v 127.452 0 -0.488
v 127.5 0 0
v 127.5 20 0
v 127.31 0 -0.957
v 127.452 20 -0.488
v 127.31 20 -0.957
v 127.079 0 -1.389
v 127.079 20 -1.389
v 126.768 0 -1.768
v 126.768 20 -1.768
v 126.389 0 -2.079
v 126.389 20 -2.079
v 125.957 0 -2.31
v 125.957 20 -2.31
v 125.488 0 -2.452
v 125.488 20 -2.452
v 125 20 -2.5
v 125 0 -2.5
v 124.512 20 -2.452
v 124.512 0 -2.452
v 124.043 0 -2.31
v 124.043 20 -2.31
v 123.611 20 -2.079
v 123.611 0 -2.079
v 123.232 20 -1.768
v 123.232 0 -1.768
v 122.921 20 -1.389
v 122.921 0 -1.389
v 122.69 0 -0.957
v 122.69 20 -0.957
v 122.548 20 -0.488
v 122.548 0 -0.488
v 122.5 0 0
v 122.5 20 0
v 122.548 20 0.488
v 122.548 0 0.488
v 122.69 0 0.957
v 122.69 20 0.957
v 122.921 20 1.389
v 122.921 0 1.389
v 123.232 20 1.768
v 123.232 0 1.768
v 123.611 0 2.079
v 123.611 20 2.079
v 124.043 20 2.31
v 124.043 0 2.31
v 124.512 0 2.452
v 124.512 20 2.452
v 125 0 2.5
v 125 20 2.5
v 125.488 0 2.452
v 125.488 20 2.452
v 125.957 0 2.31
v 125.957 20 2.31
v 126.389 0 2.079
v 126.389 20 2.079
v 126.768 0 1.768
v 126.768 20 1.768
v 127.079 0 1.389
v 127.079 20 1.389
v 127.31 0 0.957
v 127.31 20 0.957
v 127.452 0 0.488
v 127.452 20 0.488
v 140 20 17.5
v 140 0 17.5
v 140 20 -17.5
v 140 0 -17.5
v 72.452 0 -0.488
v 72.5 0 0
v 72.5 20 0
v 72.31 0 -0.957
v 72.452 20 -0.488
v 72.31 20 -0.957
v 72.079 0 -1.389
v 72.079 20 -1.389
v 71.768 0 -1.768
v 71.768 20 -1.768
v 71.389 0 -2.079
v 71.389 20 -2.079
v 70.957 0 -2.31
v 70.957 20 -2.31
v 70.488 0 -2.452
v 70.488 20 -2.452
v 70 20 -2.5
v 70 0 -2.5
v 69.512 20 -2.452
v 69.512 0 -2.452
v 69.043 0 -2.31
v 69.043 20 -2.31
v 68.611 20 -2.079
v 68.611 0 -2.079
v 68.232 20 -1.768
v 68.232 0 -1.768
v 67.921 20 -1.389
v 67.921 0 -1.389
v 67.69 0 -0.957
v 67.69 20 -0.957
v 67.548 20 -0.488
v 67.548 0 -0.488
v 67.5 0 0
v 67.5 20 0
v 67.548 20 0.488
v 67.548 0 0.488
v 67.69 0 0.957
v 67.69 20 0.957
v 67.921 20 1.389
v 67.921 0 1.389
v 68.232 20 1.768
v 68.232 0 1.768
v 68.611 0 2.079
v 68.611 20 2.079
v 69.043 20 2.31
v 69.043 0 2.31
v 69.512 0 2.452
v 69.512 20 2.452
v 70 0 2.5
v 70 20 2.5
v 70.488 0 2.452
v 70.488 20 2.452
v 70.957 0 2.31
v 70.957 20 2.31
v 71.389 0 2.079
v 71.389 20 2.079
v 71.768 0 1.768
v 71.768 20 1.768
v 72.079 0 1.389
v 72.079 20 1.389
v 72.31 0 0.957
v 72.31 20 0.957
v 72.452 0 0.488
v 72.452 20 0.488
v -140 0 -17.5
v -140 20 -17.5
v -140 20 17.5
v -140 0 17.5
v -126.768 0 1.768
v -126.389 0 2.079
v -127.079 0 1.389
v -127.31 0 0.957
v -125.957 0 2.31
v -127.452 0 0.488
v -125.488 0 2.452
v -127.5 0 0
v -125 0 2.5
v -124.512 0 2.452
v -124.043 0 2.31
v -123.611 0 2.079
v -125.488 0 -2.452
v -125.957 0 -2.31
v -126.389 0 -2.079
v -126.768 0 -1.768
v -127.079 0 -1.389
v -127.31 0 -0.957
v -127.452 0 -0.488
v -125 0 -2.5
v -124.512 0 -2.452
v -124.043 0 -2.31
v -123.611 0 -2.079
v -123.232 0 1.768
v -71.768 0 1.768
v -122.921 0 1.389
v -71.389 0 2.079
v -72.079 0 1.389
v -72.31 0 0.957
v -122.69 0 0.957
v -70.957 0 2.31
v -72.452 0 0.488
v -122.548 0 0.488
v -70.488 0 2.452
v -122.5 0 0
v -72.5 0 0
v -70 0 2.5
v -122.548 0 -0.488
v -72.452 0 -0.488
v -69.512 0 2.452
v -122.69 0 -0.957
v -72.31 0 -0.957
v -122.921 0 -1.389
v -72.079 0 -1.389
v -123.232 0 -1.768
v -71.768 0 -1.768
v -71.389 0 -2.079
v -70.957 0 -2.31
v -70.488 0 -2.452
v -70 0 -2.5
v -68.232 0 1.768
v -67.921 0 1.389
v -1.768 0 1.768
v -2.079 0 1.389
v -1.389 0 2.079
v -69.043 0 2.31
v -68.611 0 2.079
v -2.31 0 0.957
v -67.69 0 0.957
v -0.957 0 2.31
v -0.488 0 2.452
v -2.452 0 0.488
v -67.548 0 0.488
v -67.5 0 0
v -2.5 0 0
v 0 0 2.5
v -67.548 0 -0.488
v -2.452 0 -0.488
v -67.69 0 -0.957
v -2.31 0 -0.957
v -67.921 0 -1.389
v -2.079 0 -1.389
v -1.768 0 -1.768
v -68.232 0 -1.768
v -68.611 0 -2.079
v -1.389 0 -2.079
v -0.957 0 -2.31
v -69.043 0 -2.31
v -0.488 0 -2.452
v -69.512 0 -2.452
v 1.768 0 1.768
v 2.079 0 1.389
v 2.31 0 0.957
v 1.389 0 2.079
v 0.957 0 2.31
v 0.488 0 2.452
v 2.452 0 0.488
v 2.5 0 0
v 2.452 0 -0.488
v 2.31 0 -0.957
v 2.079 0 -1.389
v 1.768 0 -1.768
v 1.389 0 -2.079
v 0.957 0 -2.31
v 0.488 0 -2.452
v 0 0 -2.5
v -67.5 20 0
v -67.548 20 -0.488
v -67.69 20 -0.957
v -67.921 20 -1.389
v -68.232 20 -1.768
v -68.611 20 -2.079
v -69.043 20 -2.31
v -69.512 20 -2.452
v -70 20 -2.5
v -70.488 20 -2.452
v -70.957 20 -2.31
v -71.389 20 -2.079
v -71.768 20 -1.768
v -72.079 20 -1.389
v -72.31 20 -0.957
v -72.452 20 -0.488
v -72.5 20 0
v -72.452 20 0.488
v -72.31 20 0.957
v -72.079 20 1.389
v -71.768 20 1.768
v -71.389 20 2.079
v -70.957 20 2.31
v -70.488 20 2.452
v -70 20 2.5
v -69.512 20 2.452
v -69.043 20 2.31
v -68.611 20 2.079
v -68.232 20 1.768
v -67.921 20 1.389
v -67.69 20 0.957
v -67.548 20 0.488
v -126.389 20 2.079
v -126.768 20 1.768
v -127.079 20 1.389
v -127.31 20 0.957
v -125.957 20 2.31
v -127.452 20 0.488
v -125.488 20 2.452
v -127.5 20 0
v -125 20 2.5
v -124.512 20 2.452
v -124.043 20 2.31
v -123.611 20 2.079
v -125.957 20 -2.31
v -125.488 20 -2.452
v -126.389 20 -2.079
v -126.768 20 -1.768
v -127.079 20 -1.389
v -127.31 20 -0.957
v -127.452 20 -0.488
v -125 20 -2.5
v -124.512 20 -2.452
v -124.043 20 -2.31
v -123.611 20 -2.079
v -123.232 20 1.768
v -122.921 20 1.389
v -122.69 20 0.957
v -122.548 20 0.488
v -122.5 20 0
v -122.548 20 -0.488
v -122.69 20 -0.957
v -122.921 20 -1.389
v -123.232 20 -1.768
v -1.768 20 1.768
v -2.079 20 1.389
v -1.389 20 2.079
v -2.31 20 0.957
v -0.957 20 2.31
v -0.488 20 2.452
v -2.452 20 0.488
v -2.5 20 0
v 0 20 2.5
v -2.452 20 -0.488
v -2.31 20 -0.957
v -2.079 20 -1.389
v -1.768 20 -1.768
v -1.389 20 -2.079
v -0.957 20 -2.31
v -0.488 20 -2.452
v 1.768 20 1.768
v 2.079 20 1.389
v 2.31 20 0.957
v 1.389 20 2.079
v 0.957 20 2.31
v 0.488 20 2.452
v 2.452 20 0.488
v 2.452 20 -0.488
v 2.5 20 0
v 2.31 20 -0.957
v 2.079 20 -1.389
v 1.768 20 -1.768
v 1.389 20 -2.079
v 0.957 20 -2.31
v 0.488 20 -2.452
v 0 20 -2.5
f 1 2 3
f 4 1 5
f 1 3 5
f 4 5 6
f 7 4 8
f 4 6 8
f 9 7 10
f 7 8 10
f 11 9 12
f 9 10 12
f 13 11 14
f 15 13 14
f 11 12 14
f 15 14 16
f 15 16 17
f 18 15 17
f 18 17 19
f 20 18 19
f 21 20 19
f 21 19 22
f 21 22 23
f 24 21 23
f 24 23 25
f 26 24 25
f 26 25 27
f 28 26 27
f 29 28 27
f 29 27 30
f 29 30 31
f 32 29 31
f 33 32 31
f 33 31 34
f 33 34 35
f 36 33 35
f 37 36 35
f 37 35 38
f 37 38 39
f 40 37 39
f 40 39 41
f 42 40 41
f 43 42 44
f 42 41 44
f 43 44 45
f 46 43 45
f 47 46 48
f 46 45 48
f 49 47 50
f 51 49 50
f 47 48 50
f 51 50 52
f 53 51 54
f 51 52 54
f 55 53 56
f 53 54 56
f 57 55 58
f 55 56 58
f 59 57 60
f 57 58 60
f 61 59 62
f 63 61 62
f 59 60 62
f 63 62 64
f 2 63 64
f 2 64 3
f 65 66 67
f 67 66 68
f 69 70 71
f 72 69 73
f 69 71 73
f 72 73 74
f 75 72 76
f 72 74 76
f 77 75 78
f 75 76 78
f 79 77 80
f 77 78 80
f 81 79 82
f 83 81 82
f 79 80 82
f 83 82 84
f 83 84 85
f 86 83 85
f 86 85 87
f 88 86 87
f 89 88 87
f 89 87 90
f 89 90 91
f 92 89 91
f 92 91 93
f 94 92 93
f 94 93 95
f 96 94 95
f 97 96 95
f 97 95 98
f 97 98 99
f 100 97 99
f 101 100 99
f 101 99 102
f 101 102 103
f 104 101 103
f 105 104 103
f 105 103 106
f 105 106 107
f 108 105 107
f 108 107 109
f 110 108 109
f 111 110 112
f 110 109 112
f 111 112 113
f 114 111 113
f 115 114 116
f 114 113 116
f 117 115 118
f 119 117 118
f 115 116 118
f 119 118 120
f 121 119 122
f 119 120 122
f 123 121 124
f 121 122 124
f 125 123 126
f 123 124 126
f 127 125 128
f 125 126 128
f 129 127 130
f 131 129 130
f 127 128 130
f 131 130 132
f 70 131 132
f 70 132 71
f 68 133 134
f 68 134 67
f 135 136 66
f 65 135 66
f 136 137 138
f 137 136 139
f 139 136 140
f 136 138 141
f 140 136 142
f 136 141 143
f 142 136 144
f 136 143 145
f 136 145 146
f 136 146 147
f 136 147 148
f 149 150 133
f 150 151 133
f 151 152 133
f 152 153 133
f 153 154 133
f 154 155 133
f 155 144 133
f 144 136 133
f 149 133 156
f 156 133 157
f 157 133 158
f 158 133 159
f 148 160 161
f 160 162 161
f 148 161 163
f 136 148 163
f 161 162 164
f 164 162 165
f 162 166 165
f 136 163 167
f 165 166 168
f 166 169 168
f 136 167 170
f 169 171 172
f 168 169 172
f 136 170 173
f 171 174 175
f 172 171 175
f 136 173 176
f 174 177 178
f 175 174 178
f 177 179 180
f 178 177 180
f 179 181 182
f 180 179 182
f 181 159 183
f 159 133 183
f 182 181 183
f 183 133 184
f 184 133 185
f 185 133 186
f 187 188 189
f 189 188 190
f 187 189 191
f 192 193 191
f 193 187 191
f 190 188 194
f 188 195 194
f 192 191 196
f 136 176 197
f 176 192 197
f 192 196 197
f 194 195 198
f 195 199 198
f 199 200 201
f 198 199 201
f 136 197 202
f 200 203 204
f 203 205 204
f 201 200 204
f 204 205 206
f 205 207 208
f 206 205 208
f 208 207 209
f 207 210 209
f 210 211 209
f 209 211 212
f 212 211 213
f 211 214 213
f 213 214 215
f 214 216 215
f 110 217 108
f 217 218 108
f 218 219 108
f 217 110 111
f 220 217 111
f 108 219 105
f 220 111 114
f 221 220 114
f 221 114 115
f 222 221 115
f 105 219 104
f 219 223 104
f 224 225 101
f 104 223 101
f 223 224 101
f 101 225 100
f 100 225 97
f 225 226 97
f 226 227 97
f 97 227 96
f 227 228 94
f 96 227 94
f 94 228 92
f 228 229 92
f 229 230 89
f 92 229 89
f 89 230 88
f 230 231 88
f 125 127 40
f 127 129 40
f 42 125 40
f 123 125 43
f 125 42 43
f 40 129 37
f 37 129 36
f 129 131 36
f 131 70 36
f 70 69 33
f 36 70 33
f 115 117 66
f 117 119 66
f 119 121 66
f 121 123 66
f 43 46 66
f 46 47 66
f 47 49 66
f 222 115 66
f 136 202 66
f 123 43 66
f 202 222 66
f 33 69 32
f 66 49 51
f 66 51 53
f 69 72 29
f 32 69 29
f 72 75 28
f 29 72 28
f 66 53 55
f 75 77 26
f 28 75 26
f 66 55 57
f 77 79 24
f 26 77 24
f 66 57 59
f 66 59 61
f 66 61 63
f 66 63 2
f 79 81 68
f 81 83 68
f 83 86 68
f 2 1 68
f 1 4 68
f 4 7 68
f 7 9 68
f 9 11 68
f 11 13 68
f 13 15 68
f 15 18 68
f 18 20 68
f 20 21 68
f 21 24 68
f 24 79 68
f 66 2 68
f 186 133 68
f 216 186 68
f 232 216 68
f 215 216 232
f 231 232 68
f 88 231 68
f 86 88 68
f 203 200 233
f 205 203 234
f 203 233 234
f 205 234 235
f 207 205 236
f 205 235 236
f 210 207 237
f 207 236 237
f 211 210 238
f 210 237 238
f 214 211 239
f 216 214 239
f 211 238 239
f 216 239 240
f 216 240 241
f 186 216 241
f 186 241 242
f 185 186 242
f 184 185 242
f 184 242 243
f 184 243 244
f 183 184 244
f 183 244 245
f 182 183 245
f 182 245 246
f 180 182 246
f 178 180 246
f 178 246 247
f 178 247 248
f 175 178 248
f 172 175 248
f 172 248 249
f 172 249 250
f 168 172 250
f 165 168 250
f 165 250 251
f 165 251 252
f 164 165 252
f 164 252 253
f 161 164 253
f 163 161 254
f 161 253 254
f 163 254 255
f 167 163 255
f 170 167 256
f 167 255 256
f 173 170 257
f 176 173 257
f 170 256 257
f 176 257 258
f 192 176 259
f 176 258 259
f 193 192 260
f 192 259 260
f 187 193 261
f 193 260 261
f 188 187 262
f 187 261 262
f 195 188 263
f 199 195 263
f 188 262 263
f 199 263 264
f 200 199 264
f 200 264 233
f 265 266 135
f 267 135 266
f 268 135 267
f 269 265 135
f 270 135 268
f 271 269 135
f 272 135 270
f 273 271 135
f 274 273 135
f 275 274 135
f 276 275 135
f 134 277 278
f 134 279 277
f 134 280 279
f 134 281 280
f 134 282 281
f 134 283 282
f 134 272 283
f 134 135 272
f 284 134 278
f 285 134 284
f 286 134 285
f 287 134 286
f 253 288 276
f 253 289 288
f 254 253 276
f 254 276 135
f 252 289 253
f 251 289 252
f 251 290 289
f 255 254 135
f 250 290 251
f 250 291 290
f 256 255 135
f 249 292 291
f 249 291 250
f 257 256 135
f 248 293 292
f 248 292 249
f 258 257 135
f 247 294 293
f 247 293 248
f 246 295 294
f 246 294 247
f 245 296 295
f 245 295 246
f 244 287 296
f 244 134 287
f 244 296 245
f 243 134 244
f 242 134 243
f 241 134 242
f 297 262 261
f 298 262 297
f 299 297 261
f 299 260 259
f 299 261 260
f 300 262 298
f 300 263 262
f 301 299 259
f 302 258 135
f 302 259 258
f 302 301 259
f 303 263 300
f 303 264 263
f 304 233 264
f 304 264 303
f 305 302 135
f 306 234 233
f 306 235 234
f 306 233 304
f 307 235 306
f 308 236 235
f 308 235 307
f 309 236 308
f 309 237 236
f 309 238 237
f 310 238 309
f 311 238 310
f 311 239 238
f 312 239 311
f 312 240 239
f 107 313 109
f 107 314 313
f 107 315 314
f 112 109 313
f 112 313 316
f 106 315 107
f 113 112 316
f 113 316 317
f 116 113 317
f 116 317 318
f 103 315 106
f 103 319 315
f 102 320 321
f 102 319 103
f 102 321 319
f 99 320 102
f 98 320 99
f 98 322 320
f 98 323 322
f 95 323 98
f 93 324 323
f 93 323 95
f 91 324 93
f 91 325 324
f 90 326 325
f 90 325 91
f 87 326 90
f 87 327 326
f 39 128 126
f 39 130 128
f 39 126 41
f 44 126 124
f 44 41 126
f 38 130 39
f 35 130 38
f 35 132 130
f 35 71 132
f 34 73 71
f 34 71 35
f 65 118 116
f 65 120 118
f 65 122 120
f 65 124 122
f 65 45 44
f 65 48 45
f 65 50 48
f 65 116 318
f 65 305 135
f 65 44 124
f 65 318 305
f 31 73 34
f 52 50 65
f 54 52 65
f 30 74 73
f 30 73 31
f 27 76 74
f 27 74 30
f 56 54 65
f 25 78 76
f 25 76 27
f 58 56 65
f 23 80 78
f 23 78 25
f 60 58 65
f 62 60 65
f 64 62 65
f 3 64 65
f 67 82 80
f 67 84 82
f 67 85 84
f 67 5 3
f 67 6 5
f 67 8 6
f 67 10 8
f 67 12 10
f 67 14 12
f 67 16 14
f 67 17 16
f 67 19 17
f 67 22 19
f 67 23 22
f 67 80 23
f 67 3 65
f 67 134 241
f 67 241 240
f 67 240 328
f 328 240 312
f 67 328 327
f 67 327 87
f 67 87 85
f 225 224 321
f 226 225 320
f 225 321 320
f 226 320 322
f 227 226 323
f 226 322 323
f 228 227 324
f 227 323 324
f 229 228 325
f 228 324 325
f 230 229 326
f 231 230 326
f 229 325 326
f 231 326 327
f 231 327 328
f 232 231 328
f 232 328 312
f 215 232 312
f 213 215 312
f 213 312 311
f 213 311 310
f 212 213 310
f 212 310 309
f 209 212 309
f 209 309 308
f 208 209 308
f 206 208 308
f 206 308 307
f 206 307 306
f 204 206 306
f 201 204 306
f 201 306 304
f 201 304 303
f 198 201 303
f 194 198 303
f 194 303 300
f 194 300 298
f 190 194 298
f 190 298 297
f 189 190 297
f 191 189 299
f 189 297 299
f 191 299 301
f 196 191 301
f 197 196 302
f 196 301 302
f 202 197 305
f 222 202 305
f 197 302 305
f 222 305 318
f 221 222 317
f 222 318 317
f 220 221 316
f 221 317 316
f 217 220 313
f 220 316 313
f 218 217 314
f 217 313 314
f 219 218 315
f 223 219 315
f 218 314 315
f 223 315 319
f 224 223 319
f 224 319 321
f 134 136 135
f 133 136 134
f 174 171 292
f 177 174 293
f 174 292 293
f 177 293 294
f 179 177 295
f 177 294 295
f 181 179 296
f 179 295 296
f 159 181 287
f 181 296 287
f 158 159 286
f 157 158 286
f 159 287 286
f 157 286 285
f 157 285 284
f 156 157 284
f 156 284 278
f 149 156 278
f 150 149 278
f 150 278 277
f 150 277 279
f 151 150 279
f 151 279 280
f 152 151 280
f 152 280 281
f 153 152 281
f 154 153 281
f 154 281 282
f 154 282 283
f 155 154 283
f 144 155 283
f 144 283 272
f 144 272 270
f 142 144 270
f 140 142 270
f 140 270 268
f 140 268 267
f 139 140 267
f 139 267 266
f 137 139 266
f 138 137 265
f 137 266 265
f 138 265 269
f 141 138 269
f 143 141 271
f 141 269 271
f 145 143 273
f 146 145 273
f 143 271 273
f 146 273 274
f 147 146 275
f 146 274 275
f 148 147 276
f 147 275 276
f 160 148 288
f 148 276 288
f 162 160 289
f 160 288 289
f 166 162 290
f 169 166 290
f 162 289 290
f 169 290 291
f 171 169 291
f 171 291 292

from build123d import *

# Parameters (mm, degrees)
SKETCH1_W             = 280
SKETCH1_H             = 35
EXTRUDE1_DEPTH        = 20
M6_TAPPED_HOLE1_D     = 5
M6_TAPPED_HOLE1_DEPTH = 29
M6_TAPPED_HOLE1_TIP   = 1.502151548


with BuildPart() as part:
    # Sketch1 → Extrude1 (new body)
    with BuildSketch(Plane(origin=(0, 0, 0), x_dir=(1, 0, 0), z_dir=(0, 1, 0))):
        Rectangle(SKETCH1_W, SKETCH1_H)
    extrude(amount=EXTRUDE1_DEPTH)

    # M6 Tapped Hole1
    with Locations(Plane(origin=(0, 0, 0), x_dir=(-1, 0, 0), z_dir=(0, -1, 0))):
        with Locations((-125, 0), (-70, 0), (0, 0), (70, 0), (125, 0)):
            Hole(M6_TAPPED_HOLE1_D / 2, depth=M6_TAPPED_HOLE1_DEPTH)
            with Locations((0, 0, -(M6_TAPPED_HOLE1_DEPTH + M6_TAPPED_HOLE1_TIP / 2))):  # 118° drill point
                Cone(0, M6_TAPPED_HOLE1_D / 2, M6_TAPPED_HOLE1_TIP, mode=Mode.SUBTRACT)


solid = part.part
